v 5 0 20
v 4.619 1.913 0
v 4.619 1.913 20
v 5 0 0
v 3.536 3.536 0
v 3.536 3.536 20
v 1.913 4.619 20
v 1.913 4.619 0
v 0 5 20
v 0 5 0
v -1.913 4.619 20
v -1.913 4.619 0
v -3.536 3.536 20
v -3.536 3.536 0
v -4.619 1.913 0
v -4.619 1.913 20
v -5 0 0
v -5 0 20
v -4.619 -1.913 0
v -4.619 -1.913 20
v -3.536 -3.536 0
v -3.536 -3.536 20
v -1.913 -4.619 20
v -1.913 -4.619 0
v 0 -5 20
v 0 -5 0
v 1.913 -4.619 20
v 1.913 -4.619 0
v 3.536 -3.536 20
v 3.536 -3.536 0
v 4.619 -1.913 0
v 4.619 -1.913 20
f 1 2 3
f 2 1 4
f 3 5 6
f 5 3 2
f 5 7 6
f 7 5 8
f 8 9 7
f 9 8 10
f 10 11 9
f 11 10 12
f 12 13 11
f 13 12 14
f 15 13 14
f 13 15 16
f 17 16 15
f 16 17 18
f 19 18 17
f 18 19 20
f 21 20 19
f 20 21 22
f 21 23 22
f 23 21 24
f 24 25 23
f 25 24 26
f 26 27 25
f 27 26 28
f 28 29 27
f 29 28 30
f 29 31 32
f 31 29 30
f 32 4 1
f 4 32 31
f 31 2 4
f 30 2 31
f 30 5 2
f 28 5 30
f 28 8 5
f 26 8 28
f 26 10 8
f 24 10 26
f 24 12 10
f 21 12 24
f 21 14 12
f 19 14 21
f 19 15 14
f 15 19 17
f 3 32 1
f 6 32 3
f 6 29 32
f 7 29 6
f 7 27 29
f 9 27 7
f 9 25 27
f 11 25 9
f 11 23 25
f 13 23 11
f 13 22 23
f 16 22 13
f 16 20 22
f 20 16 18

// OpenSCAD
/**
 * @name Docblock Test Model
 * @description A simple cylinder used to verify Scadder Docblock parsing.
 * @author Scadder Bot
 * @version 1.0.0
 * @tag test
 * @tag docblock
 */

cylinder(h=20, d=10);
